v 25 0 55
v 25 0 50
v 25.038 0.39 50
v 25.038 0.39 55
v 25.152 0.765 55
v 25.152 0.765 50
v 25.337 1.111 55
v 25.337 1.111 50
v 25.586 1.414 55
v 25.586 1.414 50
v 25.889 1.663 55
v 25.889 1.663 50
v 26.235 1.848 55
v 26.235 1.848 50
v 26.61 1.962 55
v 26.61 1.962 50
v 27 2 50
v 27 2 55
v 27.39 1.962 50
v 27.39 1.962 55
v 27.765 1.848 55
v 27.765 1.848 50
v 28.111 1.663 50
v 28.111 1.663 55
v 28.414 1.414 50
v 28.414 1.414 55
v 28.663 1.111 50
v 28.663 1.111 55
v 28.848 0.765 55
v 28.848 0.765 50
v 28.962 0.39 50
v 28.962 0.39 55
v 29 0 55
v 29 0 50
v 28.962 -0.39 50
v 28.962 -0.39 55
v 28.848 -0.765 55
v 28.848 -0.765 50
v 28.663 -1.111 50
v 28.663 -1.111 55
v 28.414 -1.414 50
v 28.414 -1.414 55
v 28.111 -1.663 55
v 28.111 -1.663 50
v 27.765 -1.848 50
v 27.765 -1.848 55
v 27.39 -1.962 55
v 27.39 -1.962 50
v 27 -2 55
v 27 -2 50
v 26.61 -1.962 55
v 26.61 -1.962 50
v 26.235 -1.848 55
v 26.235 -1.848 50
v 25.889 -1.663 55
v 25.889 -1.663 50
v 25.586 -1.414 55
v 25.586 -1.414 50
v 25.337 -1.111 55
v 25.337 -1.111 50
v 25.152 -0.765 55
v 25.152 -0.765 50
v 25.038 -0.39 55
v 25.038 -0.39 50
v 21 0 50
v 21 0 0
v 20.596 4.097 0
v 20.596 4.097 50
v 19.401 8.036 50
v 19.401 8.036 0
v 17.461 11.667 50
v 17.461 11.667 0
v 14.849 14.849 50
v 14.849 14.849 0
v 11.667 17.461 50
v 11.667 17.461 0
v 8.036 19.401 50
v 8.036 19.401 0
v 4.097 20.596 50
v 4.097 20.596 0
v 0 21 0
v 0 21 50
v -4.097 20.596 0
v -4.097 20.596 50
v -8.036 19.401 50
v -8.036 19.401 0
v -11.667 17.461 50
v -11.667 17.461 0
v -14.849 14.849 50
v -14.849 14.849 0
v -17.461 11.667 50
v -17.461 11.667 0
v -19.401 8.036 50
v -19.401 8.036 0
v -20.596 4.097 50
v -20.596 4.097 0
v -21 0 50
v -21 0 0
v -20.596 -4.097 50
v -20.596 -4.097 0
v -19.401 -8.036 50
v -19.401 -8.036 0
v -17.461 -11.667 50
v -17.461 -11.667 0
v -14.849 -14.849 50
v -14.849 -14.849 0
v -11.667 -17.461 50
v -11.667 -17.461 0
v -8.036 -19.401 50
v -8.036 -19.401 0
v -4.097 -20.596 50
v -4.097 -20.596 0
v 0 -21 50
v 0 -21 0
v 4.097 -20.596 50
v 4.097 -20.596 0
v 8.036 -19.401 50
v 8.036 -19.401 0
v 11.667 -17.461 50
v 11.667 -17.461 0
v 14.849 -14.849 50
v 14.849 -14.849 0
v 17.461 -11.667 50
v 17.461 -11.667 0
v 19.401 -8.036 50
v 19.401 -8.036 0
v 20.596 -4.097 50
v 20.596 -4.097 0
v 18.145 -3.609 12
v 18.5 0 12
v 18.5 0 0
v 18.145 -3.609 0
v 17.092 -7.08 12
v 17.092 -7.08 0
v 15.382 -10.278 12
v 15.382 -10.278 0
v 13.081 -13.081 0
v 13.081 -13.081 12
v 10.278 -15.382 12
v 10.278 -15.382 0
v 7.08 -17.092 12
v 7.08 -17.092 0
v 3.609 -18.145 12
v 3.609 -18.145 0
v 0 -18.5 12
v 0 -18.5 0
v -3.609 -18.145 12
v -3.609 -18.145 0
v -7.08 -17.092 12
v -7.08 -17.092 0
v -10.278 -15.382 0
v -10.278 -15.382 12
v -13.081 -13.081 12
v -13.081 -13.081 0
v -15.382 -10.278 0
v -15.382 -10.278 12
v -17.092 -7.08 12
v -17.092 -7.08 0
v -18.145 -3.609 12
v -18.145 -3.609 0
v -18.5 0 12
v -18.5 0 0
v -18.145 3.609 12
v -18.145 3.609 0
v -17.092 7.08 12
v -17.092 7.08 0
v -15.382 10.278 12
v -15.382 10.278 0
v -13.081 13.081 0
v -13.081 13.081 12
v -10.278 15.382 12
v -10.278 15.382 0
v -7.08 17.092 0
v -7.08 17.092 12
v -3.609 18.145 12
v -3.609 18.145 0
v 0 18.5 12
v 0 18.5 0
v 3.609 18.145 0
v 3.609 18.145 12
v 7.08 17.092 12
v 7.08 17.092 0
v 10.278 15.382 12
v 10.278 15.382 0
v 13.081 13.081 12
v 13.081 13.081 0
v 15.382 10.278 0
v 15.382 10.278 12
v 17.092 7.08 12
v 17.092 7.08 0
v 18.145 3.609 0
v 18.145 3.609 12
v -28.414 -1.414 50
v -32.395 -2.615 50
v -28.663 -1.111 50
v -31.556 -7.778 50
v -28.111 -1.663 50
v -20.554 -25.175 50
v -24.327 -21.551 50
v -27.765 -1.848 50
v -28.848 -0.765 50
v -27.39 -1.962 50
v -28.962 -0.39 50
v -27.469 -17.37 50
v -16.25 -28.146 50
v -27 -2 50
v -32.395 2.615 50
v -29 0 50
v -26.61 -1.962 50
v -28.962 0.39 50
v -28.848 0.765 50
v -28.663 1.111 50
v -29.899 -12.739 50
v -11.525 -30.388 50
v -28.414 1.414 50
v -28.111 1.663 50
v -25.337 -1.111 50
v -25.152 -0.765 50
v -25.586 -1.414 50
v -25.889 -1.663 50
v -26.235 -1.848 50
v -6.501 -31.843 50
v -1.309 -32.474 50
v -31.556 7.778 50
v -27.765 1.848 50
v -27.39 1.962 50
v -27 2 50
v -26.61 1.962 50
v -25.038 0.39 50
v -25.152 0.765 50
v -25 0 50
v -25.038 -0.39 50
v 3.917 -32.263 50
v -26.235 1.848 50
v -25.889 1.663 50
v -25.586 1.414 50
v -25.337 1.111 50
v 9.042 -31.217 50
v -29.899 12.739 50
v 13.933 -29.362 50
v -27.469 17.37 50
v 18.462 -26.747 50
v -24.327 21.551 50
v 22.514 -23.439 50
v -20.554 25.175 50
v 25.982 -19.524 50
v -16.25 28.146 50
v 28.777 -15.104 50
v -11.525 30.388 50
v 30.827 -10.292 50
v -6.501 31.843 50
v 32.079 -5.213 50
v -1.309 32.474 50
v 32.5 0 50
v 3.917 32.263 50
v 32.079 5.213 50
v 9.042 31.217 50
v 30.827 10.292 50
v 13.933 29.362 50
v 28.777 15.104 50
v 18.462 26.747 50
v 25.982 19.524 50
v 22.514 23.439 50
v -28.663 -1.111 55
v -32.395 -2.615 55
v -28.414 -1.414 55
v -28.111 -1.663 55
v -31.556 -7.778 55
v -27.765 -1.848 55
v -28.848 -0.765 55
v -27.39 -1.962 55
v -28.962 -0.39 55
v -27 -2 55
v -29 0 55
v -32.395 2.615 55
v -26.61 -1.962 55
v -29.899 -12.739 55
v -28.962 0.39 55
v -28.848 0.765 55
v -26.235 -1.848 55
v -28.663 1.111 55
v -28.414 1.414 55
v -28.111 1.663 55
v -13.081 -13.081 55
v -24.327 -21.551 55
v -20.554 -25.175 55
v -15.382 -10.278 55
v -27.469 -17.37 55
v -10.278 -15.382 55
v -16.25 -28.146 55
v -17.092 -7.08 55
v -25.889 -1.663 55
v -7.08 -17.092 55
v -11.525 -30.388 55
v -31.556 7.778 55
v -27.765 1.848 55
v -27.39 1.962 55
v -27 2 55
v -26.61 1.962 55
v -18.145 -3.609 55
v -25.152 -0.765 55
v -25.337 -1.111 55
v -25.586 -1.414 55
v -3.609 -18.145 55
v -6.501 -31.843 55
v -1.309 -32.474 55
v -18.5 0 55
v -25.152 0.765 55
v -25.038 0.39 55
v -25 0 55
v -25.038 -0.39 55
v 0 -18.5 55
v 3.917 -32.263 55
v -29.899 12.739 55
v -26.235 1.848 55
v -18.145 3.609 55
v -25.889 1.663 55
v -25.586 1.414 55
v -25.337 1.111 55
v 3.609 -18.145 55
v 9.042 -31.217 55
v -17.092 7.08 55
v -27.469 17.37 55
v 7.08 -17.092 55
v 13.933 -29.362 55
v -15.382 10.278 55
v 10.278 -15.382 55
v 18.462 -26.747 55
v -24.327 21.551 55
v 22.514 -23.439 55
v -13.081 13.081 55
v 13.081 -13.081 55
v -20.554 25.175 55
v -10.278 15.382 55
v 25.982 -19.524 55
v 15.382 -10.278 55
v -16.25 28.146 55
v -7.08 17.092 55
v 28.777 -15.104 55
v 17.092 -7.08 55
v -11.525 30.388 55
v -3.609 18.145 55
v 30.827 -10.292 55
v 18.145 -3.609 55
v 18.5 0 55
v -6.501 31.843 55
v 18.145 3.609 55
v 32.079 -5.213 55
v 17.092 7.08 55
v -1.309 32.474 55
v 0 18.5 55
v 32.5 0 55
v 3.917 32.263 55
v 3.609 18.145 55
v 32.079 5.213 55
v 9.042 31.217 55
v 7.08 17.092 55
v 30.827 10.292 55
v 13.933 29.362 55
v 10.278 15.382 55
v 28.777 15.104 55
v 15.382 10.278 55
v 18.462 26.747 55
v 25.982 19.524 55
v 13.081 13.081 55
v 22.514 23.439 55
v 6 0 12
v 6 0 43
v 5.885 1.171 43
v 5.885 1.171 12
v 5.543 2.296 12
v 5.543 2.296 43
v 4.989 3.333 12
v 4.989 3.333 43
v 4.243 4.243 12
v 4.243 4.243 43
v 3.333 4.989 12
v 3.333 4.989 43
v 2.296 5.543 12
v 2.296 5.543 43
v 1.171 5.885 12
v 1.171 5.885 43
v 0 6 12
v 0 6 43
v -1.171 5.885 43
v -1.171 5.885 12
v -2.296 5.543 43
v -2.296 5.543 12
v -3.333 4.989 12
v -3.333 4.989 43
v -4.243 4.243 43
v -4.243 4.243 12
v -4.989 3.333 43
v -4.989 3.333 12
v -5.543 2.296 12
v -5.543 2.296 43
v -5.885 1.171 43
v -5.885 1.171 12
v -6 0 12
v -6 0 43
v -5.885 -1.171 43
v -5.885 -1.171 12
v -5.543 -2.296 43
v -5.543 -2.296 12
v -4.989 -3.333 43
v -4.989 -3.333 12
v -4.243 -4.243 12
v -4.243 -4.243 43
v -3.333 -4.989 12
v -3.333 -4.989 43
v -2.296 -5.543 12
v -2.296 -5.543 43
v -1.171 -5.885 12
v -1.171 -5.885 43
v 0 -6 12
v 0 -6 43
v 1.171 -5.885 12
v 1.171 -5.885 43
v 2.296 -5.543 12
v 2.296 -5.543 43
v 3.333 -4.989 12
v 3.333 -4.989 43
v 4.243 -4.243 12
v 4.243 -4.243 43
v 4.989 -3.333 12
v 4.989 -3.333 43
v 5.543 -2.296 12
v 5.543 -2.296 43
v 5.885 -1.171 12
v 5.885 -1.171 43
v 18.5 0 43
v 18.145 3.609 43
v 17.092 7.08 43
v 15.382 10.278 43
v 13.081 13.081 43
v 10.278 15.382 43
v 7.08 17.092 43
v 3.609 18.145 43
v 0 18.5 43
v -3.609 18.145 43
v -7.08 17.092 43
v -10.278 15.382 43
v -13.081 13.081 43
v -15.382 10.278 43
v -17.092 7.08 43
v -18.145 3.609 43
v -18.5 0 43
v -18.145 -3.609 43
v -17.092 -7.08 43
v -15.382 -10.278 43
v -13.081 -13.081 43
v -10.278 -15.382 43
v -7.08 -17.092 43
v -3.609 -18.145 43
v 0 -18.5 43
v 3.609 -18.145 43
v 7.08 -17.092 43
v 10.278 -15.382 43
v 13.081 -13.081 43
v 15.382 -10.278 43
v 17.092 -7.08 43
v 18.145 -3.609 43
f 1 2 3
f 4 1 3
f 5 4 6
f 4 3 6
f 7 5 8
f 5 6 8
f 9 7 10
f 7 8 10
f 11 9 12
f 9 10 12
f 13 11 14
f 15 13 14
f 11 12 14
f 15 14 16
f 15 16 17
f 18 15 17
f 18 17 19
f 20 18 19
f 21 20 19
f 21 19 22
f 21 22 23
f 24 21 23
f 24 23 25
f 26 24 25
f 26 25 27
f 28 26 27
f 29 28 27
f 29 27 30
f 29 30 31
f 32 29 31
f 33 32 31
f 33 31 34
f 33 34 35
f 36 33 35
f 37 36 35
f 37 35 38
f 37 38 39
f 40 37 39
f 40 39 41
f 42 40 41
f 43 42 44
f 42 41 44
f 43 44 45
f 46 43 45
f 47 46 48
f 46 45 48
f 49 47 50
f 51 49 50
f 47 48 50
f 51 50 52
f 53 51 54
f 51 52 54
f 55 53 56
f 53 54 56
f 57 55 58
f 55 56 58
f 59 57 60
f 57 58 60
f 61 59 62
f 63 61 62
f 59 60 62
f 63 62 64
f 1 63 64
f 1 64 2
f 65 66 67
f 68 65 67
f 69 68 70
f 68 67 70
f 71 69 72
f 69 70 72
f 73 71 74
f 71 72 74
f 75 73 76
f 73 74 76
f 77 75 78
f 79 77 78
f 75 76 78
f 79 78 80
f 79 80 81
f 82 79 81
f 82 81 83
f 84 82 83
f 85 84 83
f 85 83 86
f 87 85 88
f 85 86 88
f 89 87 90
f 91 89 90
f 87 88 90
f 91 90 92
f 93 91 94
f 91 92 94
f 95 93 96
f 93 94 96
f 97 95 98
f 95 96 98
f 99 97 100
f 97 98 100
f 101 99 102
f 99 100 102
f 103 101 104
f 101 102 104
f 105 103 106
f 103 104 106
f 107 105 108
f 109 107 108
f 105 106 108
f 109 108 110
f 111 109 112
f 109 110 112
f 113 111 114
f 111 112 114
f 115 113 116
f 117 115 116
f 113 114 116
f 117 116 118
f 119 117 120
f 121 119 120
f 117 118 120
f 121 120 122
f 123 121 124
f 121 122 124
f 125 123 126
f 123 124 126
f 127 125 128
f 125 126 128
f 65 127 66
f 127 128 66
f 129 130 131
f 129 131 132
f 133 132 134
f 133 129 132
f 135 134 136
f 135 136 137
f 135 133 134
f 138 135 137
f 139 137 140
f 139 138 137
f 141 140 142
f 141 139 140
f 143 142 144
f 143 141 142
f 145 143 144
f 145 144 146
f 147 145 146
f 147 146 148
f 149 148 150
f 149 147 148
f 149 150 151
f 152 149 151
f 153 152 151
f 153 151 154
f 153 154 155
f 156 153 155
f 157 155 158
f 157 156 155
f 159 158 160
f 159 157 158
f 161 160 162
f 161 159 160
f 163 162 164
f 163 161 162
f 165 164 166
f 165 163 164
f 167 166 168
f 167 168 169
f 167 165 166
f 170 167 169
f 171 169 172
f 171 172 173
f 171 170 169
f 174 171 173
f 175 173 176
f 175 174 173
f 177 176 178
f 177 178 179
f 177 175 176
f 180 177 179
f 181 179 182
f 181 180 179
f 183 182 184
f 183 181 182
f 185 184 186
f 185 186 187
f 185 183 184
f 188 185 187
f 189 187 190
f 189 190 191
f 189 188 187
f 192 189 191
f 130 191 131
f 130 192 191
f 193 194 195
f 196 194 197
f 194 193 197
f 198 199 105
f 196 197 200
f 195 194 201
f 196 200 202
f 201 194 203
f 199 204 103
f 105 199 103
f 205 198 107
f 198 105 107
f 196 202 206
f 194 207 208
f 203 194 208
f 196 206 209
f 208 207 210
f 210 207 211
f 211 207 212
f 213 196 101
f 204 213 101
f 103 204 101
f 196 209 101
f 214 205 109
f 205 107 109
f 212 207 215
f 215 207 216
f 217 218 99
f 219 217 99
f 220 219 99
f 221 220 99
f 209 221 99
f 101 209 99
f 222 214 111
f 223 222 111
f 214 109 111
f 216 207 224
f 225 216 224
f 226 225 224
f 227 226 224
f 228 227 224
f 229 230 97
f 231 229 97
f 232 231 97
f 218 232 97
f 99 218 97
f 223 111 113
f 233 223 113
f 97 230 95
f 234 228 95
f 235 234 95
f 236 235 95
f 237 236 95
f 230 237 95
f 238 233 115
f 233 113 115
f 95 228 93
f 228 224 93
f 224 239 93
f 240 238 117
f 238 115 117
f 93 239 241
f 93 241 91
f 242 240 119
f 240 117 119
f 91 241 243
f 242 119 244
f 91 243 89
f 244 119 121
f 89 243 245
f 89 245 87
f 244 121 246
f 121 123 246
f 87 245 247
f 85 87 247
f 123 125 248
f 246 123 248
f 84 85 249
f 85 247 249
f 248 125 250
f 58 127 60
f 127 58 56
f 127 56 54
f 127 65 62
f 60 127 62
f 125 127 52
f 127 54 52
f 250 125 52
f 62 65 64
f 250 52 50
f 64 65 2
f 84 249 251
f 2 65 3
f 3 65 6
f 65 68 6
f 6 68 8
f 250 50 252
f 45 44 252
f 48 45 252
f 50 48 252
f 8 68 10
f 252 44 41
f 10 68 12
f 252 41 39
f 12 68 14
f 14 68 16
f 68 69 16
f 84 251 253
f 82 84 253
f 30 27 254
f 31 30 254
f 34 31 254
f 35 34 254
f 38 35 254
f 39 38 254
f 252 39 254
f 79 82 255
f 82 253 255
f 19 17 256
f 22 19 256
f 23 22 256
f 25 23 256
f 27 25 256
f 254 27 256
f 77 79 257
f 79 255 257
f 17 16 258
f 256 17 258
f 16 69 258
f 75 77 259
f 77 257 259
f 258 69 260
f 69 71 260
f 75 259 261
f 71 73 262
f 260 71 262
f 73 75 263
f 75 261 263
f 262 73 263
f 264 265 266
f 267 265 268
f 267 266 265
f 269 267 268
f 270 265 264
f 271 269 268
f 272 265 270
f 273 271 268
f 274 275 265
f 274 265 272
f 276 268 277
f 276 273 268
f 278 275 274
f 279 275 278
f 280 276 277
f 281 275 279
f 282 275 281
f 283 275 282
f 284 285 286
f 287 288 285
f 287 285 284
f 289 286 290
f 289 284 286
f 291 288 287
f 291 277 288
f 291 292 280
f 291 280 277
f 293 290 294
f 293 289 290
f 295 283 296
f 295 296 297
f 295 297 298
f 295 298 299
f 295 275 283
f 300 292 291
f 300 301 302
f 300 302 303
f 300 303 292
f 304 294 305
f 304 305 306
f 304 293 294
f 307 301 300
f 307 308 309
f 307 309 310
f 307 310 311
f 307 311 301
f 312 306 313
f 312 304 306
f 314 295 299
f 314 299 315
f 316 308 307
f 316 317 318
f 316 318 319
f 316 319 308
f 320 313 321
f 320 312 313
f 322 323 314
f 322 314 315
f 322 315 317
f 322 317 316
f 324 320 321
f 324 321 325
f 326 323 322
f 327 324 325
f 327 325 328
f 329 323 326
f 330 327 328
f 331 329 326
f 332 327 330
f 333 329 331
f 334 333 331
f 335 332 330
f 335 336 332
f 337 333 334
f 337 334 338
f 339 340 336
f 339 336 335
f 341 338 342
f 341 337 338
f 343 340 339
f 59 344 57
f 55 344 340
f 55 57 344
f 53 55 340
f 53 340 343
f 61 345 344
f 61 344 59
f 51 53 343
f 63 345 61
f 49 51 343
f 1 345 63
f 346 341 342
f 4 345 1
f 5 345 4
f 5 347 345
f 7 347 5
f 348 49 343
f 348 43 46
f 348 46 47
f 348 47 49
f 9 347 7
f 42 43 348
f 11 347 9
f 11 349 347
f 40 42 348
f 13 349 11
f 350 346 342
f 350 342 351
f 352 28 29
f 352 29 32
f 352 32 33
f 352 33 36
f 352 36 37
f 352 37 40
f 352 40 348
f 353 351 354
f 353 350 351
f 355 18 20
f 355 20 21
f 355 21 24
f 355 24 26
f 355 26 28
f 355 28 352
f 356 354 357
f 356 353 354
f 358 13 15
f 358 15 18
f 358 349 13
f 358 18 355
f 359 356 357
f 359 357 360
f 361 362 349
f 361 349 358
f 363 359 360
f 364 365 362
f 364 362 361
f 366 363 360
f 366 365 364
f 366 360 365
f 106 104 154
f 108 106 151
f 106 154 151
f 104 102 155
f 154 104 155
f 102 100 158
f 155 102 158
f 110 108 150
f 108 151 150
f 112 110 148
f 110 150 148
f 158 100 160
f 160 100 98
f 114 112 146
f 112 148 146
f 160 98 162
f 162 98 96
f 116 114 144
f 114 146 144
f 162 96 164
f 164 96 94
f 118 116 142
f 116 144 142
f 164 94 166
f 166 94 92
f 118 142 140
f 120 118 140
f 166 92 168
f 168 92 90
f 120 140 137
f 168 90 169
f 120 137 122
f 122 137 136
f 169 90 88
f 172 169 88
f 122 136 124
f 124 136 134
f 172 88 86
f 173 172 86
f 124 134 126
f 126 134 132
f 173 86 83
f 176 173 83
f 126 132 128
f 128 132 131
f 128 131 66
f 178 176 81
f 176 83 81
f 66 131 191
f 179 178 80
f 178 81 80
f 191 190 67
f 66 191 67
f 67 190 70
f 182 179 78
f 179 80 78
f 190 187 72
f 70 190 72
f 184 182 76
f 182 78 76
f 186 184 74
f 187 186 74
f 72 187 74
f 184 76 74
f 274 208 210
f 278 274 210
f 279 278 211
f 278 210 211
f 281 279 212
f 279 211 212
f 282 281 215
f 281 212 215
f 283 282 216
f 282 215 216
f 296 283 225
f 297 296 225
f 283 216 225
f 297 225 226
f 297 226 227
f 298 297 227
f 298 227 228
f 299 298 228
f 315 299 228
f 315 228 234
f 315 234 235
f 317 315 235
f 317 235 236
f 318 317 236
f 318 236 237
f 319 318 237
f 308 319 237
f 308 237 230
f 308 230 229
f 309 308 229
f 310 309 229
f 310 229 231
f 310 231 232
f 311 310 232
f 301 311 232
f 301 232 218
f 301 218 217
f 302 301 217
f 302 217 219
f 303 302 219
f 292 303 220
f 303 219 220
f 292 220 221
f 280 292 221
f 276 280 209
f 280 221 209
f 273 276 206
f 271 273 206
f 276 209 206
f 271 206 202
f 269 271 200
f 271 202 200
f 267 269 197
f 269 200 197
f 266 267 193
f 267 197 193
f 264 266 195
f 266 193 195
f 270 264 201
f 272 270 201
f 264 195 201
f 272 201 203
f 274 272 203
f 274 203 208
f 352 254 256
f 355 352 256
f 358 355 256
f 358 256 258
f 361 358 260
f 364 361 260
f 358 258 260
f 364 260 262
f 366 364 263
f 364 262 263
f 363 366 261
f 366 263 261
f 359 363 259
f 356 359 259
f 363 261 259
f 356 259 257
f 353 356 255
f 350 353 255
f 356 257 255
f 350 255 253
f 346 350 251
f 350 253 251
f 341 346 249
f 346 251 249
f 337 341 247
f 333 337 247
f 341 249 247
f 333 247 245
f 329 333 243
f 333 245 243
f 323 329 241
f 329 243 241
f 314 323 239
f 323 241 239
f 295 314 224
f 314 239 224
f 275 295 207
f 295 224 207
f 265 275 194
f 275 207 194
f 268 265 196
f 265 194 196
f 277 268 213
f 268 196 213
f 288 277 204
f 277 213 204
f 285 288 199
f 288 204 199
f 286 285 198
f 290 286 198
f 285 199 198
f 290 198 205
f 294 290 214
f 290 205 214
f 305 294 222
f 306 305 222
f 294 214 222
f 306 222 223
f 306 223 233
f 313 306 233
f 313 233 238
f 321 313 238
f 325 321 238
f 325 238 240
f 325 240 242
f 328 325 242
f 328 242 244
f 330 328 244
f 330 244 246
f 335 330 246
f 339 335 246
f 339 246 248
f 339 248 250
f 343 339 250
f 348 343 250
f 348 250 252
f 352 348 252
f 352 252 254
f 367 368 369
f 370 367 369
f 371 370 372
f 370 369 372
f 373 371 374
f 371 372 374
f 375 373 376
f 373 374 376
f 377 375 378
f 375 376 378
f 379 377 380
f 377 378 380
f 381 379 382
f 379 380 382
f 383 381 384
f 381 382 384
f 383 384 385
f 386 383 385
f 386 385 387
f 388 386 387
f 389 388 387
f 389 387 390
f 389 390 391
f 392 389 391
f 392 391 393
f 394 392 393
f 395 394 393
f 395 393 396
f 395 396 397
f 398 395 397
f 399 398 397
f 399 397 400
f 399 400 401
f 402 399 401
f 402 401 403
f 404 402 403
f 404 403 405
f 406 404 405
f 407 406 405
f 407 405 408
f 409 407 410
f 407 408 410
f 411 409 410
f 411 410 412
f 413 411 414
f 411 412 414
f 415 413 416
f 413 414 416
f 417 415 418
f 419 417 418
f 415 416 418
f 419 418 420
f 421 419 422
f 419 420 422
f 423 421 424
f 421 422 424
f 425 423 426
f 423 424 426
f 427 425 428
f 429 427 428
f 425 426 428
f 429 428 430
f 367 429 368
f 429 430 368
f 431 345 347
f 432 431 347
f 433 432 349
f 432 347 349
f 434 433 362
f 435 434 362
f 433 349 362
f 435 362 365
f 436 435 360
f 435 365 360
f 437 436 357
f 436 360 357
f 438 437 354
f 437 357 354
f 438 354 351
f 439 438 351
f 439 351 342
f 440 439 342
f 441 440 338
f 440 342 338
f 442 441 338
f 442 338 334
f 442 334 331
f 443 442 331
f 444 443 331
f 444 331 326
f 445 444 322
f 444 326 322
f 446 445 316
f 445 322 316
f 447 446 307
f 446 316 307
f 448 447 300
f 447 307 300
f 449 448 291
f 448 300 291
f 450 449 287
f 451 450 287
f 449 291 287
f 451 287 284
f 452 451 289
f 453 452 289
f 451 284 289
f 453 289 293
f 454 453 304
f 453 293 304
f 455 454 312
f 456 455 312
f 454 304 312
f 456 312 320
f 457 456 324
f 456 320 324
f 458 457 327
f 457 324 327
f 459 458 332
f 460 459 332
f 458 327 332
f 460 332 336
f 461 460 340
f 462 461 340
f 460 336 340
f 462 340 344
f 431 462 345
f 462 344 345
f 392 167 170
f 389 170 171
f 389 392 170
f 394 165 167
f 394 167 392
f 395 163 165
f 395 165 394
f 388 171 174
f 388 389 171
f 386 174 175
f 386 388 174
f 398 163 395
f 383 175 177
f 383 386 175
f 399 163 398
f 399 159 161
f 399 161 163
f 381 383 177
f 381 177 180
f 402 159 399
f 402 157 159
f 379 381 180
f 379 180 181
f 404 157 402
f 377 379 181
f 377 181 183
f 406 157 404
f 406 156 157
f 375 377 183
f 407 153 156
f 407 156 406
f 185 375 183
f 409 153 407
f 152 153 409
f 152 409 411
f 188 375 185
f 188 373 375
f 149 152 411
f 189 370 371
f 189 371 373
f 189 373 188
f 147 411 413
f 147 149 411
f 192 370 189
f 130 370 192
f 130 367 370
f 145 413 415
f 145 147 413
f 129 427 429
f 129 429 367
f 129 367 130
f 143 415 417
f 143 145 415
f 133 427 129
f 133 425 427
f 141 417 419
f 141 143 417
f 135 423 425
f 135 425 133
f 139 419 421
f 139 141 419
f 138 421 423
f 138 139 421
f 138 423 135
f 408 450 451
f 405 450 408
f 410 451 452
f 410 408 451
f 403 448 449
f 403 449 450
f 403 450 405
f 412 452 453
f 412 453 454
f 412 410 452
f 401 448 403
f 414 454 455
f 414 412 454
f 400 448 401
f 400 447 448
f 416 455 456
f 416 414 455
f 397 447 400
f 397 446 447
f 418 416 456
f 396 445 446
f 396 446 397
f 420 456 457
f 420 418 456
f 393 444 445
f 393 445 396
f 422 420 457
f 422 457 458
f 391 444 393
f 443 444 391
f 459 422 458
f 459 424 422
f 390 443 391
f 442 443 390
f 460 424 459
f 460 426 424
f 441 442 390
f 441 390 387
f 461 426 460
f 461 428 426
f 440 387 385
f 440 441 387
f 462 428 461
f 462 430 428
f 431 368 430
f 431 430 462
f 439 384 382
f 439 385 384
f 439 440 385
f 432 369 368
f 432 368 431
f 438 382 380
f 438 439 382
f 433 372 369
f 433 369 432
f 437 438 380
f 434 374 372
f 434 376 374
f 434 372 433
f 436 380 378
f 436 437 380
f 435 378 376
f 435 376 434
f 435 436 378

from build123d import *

# Parameters (mm, degrees)
ESQUISSE1_R             = 21
BOSS_EXTRU_1_DEPTH      = 50
ESQUISSE2_R             = 32.5
BOSS_EXTRU_2_DEPTH      = 5
ESQUISSE3_R             = 18.5
ENL_V_MAT_EXTRU_1_DEPTH = 12
ESQUISSE4_R             = 6
ENL_V_MAT_EXTRU_2_DEPTH = 49
ENL_V_START             = -12
ESQUISSE5_R             = 18.5
ENL_V_MAT_EXTRU_3_DEPTH = 12
ESQUISSE6_R             = 2
ENL_V_MAT_EXTRU_4_DEPTH = 6


with BuildPart() as part:
    # Esquisse1 → Boss.-Extru.1 (new body)
    with BuildSketch(Plane.XY):
        Circle(ESQUISSE1_R)
    extrude(amount=BOSS_EXTRU_1_DEPTH)

    # Esquisse2 → Boss.-Extru.2 (add)
    with BuildSketch(Plane.XY.offset(50)):
        Circle(ESQUISSE2_R)
    extrude(amount=BOSS_EXTRU_2_DEPTH)

    # Esquisse3 → Enlèv. mat.-Extru.1 (cut)
    with BuildSketch(Plane.XY.offset(55)):
        Circle(ESQUISSE3_R)
    extrude(amount=-ENL_V_MAT_EXTRU_1_DEPTH, mode=Mode.SUBTRACT)

    # Esquisse4 → Enlèv. mat.-Extru.2 (cut)
    with BuildSketch(Plane.XY.offset(43)):
        Circle(ESQUISSE4_R)
    extrude(amount=-ENL_V_MAT_EXTRU_2_DEPTH, mode=Mode.SUBTRACT)

    # Esquisse5 → Enlèv. mat.-Extru.3 (cut)
    with BuildSketch(Plane(origin=(0, 0, 0), x_dir=(-1, 0, 0), z_dir=(0, 0, -1)).offset(ENL_V_START)):
        with Locations(Location((0, 0, 0), (0, 0, 180))):
            Circle(ESQUISSE5_R)
    extrude(amount=ENL_V_MAT_EXTRU_3_DEPTH, mode=Mode.SUBTRACT)

    # Esquisse6 → Enlèv. mat.-Extru.4 (cut)
    with BuildSketch(Plane(origin=(0, 0, 50), x_dir=(-1, 0, 0), z_dir=(0, 0, -1))):
        with Locations((27, 0)):
            Circle(ESQUISSE6_R)
        with Locations((-27, 0)):
            Circle(ESQUISSE6_R)
    extrude(amount=-ENL_V_MAT_EXTRU_4_DEPTH, mode=Mode.SUBTRACT)


solid = part.part
